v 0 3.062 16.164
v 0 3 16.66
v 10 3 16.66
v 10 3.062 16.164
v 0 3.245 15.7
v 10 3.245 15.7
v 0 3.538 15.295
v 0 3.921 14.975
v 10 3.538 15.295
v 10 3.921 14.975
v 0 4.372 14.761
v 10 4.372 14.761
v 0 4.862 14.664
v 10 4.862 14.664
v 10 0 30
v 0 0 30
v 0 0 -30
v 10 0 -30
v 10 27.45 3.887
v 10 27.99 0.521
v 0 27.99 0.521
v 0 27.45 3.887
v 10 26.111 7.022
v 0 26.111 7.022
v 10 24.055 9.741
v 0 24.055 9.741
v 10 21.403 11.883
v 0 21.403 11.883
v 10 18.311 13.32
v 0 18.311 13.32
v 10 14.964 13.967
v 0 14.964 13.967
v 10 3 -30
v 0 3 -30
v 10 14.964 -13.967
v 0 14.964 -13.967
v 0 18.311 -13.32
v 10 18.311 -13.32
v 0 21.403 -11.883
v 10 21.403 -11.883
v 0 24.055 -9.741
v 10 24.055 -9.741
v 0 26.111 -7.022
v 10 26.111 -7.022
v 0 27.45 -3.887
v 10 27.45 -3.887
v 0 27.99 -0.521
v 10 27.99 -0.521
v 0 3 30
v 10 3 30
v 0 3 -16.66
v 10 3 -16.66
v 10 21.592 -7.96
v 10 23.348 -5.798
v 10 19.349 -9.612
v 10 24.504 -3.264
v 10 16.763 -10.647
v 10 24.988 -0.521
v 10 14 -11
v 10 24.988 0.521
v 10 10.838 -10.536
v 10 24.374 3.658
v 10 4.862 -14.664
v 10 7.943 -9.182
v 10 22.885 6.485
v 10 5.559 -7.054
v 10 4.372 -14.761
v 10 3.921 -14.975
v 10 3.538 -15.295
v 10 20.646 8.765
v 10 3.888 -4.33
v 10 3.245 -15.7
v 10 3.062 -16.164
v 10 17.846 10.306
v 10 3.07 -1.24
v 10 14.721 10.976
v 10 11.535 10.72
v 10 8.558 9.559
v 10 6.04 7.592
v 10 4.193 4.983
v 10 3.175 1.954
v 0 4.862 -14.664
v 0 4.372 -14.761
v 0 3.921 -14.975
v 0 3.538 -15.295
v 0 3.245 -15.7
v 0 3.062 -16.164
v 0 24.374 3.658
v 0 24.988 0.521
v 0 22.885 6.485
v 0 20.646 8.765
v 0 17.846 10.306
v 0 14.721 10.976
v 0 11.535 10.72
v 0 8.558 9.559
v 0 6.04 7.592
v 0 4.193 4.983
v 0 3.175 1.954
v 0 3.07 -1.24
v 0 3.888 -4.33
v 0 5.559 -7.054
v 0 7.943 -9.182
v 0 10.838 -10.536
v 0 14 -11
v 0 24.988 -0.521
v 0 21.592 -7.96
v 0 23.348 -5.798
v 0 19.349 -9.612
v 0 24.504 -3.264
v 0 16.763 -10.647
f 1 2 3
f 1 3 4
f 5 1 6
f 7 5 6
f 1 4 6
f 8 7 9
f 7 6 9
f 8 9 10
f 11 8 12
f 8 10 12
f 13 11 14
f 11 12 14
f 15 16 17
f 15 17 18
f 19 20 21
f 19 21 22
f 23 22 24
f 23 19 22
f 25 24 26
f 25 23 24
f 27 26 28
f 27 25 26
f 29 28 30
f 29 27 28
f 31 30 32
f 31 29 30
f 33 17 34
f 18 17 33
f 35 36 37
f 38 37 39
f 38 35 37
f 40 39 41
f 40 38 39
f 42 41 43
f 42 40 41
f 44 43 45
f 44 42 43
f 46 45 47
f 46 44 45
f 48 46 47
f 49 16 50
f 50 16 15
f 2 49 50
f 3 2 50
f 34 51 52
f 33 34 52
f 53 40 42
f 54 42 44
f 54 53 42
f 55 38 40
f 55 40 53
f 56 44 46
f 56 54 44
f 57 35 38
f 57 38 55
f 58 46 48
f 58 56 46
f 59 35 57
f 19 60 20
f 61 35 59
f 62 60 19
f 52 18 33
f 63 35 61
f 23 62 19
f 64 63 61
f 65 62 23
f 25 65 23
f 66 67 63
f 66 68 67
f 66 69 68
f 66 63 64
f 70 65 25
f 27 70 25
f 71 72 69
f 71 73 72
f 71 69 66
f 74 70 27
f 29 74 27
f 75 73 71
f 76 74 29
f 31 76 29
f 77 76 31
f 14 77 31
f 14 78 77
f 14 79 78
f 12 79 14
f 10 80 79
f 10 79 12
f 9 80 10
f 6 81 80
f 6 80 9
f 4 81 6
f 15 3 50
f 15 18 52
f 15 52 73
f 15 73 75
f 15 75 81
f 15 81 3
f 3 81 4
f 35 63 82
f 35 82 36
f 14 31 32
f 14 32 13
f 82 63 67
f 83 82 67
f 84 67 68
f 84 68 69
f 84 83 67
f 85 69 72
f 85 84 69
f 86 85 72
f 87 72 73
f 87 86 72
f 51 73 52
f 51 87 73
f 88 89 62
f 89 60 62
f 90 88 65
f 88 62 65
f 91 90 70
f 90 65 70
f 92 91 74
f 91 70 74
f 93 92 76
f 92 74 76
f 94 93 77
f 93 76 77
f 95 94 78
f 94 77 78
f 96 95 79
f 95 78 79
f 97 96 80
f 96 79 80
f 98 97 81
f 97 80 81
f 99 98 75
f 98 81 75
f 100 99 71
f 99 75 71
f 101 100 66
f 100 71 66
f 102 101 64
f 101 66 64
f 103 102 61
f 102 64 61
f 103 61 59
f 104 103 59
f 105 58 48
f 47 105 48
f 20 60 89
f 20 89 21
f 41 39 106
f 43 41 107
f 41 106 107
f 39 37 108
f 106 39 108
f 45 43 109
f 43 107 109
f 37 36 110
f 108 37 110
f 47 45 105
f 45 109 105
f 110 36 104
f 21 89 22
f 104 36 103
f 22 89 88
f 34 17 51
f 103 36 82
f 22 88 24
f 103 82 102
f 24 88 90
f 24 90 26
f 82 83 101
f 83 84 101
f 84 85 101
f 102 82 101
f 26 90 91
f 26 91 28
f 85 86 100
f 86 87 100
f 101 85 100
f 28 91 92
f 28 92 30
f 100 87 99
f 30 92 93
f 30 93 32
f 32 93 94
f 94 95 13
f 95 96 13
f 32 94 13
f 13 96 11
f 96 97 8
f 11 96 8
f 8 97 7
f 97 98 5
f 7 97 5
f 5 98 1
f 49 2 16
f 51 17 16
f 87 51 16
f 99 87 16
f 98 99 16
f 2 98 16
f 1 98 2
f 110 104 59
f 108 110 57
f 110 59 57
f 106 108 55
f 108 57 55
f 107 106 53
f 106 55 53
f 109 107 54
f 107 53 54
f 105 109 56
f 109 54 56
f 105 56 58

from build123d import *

# Parameters (mm, degrees)
BOSS_EXTRUDE1_DEPTH     = 10
BOSS_EXTRUDE3_DEPTH     = 10
SKETCH5_W               = 10
SKETCH5_H               = 60
BOSS_EXTRUDE4_DEPTH     = 3
FILLET2_R               = 2
SKETCH2_R               = 11
ENL_V_MAT_EXTRU_1_DEPTH = 11
ESQUISSE3_W             = 1.042364678
ESQUISSE3_H             = 5.062914153
ENL_V_MAT_EXTRU_2_DEPTH = 11


with BuildPart() as part:
    # Sketch1 → Boss-Extrude1 (new body)
    with BuildSketch(Plane(origin=(0, 0, 0), x_dir=(0, 0, -1), z_dir=(1, 0, 0))):
        with BuildLine():
            Line((-15, 0), (15, 0))
            Line((15, 0), (9.520917343, 17.058125725))
            ThreePointArc((9.520917343, 17.058125725), (0, 24), (-9.520917343, 17.058125725))
            Line((-9.520917343, 17.058125725), (-15, 0))
        make_face()
    extrude(amount=BOSS_EXTRUDE1_DEPTH)

    # Sketch4 → Boss-Extrude3 (add)
    with BuildSketch(Plane(origin=(10, 0, 0), x_dir=(0, 0, -1), z_dir=(1, 0, 0))):
        with BuildLine():
            Line((9.520917343, 17.058125725), (15, 0))
            Line((15, 0), (13.966745843, 14.964370546))
            ThreePointArc((13.966745843, 14.964370546), (0, 28), (-13.966745843, 14.964370546))
            Line((-13.966745843, 14.964370546), (-15, 0))
            Line((-15, 0), (-9.520917343, 17.058125725))
            ThreePointArc((-9.520917343, 17.058125725), (0, 24), (9.520917343, 17.058125725))
        make_face()
    extrude(amount=-BOSS_EXTRUDE3_DEPTH)

    # Sketch5 → Boss-Extrude4 (add)
    with BuildSketch(Plane.XZ):
        with Locations((5, 0)):
            Rectangle(SKETCH5_W, SKETCH5_H)
    extrude(amount=-BOSS_EXTRUDE4_DEPTH)

    # Fillet2
    fillet2_edges = [part.edges().sort_by_distance(p)[0] for p in [
        (5, 3, -14.792857143),
        (5, 3, 14.792857143),
    ]]
    fillet(fillet2_edges, radius=FILLET2_R)

    # Sketch2 → Enlèv. mat.-Extru.1 (cut, through all)
    with BuildSketch(Plane(origin=(10, 0, 0), x_dir=(0, 0, -1), z_dir=(1, 0, 0))):
        with Locations((0, 14)):
            Circle(SKETCH2_R)
    extrude(amount=-ENL_V_MAT_EXTRU_1_DEPTH, mode=Mode.SUBTRACT)

    # Esquisse3 → Enlèv. mat.-Extru.2 (cut, through all)
    with BuildSketch(Plane(origin=(10, 0, 0), x_dir=(0, 0, -1), z_dir=(1, 0, 0))):
        with Locations((0, 26.657285384)):
            Rectangle(ESQUISSE3_W, ESQUISSE3_H)
    extrude(amount=-ENL_V_MAT_EXTRU_2_DEPTH, mode=Mode.SUBTRACT)


solid = part.part
